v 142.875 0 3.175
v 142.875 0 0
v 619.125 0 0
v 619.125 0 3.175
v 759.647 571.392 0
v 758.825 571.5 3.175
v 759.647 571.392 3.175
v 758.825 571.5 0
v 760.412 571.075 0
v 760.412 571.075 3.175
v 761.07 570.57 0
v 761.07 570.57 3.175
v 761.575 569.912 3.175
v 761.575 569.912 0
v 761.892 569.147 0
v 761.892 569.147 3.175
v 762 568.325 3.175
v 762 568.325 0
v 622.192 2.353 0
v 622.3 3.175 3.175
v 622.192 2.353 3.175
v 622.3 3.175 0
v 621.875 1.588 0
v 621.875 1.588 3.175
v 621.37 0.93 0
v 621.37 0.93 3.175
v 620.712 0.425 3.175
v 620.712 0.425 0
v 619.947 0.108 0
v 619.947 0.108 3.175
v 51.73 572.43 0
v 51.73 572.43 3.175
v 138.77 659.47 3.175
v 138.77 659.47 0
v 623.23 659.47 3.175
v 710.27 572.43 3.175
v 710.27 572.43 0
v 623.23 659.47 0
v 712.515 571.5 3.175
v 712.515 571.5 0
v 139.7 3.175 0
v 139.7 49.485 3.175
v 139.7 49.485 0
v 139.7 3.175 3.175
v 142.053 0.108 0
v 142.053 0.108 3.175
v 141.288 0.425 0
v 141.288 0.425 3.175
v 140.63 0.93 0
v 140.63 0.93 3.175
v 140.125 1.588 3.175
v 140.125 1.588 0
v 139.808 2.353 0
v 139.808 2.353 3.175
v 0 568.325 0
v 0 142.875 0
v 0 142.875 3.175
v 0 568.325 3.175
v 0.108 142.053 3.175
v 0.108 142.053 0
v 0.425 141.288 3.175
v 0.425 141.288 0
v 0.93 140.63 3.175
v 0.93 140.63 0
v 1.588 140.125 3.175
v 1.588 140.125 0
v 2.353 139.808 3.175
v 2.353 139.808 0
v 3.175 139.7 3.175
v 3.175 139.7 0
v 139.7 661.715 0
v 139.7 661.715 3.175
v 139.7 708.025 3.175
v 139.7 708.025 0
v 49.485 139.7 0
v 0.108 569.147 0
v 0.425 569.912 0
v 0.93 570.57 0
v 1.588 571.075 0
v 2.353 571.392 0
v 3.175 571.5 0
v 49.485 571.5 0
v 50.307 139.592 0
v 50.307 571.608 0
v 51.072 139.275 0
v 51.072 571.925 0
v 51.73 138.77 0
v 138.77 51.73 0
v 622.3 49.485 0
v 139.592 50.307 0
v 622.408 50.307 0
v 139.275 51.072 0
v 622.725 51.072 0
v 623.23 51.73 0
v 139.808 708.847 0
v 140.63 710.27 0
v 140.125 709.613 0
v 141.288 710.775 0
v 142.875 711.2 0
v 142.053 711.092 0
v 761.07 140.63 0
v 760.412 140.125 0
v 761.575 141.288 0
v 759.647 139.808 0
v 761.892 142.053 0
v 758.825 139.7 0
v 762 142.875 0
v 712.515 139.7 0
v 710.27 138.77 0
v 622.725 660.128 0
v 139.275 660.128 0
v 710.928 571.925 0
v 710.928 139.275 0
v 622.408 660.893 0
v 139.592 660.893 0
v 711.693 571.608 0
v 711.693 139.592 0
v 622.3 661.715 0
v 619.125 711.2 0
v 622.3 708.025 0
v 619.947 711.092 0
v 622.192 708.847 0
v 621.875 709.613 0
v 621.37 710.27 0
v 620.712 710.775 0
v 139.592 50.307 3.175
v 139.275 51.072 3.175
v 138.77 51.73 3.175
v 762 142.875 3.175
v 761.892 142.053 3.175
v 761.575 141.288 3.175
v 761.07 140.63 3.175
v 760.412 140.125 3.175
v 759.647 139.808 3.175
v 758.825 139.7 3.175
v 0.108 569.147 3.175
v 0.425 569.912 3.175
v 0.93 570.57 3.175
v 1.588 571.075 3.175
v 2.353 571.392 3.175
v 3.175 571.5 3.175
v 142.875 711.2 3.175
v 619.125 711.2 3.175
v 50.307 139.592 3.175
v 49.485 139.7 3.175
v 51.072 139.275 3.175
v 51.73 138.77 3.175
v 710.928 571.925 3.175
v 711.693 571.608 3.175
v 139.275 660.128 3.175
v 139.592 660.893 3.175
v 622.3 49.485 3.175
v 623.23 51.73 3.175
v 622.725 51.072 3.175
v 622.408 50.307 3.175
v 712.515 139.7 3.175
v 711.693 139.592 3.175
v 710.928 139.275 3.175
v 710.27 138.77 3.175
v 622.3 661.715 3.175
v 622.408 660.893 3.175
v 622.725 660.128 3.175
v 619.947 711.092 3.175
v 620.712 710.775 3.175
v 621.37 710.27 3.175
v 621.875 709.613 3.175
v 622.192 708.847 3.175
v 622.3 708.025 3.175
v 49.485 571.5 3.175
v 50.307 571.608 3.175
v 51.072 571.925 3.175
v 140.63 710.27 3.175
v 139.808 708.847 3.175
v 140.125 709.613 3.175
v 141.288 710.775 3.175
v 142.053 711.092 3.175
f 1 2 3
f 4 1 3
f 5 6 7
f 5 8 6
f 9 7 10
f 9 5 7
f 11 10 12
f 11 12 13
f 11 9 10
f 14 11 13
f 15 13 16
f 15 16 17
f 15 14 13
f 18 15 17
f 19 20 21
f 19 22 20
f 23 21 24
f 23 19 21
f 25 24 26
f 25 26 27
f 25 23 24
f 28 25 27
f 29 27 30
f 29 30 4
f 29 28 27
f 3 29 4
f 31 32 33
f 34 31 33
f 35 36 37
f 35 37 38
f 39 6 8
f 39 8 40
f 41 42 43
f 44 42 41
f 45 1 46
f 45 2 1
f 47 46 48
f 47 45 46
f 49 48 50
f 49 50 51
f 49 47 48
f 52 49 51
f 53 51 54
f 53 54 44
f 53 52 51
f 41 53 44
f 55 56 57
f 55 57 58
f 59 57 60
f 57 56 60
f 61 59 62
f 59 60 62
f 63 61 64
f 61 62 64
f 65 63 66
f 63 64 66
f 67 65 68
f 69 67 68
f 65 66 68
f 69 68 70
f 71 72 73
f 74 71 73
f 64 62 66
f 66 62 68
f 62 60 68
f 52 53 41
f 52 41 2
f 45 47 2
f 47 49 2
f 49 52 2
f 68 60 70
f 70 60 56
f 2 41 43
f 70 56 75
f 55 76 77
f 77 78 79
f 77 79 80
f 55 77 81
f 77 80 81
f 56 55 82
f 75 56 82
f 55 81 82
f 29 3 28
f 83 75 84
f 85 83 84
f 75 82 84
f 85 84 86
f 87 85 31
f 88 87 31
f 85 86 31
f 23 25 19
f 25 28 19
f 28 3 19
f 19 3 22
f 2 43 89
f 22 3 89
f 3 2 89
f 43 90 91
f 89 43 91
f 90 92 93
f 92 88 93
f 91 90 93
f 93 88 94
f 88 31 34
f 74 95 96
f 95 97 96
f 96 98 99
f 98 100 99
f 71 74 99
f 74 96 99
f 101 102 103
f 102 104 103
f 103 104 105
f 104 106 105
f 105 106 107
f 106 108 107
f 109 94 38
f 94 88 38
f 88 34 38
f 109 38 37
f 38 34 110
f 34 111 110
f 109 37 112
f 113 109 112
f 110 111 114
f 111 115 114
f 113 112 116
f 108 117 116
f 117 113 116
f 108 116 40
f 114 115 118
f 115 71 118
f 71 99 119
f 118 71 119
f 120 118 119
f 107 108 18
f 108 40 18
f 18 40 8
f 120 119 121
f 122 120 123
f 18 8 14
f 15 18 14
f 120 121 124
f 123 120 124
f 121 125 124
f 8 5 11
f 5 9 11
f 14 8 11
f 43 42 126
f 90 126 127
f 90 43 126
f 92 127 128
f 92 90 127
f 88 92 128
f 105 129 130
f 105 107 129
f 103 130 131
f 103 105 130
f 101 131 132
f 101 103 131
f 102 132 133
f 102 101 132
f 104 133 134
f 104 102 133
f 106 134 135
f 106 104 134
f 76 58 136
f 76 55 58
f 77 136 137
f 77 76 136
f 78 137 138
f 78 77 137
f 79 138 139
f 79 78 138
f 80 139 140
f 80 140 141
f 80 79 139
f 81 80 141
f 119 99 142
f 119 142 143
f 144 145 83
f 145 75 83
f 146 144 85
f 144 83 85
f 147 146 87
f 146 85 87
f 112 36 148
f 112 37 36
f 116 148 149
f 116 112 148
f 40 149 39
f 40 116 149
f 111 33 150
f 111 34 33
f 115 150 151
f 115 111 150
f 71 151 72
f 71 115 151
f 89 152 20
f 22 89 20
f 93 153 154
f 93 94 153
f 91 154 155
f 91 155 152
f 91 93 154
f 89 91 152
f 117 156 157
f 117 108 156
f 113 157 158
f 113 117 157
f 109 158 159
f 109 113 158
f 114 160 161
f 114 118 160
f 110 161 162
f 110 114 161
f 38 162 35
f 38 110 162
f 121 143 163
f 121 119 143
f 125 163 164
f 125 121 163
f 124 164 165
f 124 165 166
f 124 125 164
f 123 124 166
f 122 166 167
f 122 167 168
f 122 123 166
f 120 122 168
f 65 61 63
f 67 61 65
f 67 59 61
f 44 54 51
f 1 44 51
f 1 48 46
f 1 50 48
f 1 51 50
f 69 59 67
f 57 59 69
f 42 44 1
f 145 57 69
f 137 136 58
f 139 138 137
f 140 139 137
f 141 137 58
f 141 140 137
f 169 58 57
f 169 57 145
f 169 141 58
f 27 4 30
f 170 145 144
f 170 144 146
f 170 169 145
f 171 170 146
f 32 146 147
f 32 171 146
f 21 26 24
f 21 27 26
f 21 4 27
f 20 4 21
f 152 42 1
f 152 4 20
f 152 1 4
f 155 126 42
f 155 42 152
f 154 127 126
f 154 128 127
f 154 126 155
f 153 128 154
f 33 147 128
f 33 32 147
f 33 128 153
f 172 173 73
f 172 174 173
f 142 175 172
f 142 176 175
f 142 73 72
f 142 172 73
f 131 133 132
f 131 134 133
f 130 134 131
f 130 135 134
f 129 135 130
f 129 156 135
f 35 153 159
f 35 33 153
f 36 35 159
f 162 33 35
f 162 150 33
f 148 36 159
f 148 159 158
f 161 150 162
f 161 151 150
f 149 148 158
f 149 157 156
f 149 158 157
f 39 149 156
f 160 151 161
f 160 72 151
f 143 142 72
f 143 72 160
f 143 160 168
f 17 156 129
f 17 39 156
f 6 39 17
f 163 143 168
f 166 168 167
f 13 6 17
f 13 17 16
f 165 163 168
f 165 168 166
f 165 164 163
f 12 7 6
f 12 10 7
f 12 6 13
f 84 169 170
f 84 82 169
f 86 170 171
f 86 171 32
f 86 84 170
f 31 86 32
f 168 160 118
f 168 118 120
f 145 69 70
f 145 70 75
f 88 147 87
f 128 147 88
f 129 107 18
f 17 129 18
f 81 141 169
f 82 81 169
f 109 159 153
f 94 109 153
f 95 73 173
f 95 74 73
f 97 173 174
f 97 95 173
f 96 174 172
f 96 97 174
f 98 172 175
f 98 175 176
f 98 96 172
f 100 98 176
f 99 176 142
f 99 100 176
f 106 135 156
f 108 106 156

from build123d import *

# Parameters (mm, degrees)
SKETCH1_W           = 762
SKETCH1_H           = 711.2
BOSS_EXTRUDE1_DEPTH = 3.175
CUT_EXTRUDE1_DEPTH  = 4.175
FILLET1_R           = 3.175


with BuildPart() as part:
    # Sketch1 → Boss-Extrude1 (new body)
    with BuildSketch(Plane.XY):
        with Locations((381, 355.6)):
            Rectangle(SKETCH1_W, SKETCH1_H)
    extrude(amount=BOSS_EXTRUDE1_DEPTH)

    # Sketch2 → Cut-Extrude1 (cut, through all)
    with BuildSketch(Plane.XY.offset(3.175)):
        Polygon((0, 571.5), (50.8, 571.5), (139.7, 660.4), (139.7, 711.2), (0, 711.2), align=None)
        Polygon((139.7, 50.8), (139.7, 0), (0, 0), (0, 139.7), (50.8, 139.7), align=None)
        Polygon((762, 139.7), (711.2, 139.7), (622.3, 50.8), (622.3, 0), (762, 0), align=None)
        Polygon((622.3, 660.4), (622.3, 711.2), (762, 711.2), (762, 571.5), (711.2, 571.5), align=None)
    extrude(amount=-CUT_EXTRUDE1_DEPTH, mode=Mode.SUBTRACT)

    # Fillet1
    fillet1_edges = [part.edges().sort_by_distance(p)[0] for p in [
        (711.2, 571.5, 1.5875),
        (622.3, 660.4, 1.5875),
        (622.3, 711.2, 1.5875),
        (762, 571.5, 1.5875),
        (762, 139.7, 1.5875),
        (622.3, 0, 1.5875),
        (622.3, 50.8, 1.5875),
        (711.2, 139.7, 1.5875),
        (50.8, 139.7, 1.5875),
        (139.7, 50.8, 1.5875),
        (139.7, 0, 1.5875),
        (0, 139.7, 1.5875),
        (0, 571.5, 1.5875),
        (139.7, 711.2, 1.5875),
        (139.7, 660.4, 1.5875),
        (50.8, 571.5, 1.5875),
    ]]
    fillet(fillet1_edges, radius=FILLET1_R)


solid = part.part
